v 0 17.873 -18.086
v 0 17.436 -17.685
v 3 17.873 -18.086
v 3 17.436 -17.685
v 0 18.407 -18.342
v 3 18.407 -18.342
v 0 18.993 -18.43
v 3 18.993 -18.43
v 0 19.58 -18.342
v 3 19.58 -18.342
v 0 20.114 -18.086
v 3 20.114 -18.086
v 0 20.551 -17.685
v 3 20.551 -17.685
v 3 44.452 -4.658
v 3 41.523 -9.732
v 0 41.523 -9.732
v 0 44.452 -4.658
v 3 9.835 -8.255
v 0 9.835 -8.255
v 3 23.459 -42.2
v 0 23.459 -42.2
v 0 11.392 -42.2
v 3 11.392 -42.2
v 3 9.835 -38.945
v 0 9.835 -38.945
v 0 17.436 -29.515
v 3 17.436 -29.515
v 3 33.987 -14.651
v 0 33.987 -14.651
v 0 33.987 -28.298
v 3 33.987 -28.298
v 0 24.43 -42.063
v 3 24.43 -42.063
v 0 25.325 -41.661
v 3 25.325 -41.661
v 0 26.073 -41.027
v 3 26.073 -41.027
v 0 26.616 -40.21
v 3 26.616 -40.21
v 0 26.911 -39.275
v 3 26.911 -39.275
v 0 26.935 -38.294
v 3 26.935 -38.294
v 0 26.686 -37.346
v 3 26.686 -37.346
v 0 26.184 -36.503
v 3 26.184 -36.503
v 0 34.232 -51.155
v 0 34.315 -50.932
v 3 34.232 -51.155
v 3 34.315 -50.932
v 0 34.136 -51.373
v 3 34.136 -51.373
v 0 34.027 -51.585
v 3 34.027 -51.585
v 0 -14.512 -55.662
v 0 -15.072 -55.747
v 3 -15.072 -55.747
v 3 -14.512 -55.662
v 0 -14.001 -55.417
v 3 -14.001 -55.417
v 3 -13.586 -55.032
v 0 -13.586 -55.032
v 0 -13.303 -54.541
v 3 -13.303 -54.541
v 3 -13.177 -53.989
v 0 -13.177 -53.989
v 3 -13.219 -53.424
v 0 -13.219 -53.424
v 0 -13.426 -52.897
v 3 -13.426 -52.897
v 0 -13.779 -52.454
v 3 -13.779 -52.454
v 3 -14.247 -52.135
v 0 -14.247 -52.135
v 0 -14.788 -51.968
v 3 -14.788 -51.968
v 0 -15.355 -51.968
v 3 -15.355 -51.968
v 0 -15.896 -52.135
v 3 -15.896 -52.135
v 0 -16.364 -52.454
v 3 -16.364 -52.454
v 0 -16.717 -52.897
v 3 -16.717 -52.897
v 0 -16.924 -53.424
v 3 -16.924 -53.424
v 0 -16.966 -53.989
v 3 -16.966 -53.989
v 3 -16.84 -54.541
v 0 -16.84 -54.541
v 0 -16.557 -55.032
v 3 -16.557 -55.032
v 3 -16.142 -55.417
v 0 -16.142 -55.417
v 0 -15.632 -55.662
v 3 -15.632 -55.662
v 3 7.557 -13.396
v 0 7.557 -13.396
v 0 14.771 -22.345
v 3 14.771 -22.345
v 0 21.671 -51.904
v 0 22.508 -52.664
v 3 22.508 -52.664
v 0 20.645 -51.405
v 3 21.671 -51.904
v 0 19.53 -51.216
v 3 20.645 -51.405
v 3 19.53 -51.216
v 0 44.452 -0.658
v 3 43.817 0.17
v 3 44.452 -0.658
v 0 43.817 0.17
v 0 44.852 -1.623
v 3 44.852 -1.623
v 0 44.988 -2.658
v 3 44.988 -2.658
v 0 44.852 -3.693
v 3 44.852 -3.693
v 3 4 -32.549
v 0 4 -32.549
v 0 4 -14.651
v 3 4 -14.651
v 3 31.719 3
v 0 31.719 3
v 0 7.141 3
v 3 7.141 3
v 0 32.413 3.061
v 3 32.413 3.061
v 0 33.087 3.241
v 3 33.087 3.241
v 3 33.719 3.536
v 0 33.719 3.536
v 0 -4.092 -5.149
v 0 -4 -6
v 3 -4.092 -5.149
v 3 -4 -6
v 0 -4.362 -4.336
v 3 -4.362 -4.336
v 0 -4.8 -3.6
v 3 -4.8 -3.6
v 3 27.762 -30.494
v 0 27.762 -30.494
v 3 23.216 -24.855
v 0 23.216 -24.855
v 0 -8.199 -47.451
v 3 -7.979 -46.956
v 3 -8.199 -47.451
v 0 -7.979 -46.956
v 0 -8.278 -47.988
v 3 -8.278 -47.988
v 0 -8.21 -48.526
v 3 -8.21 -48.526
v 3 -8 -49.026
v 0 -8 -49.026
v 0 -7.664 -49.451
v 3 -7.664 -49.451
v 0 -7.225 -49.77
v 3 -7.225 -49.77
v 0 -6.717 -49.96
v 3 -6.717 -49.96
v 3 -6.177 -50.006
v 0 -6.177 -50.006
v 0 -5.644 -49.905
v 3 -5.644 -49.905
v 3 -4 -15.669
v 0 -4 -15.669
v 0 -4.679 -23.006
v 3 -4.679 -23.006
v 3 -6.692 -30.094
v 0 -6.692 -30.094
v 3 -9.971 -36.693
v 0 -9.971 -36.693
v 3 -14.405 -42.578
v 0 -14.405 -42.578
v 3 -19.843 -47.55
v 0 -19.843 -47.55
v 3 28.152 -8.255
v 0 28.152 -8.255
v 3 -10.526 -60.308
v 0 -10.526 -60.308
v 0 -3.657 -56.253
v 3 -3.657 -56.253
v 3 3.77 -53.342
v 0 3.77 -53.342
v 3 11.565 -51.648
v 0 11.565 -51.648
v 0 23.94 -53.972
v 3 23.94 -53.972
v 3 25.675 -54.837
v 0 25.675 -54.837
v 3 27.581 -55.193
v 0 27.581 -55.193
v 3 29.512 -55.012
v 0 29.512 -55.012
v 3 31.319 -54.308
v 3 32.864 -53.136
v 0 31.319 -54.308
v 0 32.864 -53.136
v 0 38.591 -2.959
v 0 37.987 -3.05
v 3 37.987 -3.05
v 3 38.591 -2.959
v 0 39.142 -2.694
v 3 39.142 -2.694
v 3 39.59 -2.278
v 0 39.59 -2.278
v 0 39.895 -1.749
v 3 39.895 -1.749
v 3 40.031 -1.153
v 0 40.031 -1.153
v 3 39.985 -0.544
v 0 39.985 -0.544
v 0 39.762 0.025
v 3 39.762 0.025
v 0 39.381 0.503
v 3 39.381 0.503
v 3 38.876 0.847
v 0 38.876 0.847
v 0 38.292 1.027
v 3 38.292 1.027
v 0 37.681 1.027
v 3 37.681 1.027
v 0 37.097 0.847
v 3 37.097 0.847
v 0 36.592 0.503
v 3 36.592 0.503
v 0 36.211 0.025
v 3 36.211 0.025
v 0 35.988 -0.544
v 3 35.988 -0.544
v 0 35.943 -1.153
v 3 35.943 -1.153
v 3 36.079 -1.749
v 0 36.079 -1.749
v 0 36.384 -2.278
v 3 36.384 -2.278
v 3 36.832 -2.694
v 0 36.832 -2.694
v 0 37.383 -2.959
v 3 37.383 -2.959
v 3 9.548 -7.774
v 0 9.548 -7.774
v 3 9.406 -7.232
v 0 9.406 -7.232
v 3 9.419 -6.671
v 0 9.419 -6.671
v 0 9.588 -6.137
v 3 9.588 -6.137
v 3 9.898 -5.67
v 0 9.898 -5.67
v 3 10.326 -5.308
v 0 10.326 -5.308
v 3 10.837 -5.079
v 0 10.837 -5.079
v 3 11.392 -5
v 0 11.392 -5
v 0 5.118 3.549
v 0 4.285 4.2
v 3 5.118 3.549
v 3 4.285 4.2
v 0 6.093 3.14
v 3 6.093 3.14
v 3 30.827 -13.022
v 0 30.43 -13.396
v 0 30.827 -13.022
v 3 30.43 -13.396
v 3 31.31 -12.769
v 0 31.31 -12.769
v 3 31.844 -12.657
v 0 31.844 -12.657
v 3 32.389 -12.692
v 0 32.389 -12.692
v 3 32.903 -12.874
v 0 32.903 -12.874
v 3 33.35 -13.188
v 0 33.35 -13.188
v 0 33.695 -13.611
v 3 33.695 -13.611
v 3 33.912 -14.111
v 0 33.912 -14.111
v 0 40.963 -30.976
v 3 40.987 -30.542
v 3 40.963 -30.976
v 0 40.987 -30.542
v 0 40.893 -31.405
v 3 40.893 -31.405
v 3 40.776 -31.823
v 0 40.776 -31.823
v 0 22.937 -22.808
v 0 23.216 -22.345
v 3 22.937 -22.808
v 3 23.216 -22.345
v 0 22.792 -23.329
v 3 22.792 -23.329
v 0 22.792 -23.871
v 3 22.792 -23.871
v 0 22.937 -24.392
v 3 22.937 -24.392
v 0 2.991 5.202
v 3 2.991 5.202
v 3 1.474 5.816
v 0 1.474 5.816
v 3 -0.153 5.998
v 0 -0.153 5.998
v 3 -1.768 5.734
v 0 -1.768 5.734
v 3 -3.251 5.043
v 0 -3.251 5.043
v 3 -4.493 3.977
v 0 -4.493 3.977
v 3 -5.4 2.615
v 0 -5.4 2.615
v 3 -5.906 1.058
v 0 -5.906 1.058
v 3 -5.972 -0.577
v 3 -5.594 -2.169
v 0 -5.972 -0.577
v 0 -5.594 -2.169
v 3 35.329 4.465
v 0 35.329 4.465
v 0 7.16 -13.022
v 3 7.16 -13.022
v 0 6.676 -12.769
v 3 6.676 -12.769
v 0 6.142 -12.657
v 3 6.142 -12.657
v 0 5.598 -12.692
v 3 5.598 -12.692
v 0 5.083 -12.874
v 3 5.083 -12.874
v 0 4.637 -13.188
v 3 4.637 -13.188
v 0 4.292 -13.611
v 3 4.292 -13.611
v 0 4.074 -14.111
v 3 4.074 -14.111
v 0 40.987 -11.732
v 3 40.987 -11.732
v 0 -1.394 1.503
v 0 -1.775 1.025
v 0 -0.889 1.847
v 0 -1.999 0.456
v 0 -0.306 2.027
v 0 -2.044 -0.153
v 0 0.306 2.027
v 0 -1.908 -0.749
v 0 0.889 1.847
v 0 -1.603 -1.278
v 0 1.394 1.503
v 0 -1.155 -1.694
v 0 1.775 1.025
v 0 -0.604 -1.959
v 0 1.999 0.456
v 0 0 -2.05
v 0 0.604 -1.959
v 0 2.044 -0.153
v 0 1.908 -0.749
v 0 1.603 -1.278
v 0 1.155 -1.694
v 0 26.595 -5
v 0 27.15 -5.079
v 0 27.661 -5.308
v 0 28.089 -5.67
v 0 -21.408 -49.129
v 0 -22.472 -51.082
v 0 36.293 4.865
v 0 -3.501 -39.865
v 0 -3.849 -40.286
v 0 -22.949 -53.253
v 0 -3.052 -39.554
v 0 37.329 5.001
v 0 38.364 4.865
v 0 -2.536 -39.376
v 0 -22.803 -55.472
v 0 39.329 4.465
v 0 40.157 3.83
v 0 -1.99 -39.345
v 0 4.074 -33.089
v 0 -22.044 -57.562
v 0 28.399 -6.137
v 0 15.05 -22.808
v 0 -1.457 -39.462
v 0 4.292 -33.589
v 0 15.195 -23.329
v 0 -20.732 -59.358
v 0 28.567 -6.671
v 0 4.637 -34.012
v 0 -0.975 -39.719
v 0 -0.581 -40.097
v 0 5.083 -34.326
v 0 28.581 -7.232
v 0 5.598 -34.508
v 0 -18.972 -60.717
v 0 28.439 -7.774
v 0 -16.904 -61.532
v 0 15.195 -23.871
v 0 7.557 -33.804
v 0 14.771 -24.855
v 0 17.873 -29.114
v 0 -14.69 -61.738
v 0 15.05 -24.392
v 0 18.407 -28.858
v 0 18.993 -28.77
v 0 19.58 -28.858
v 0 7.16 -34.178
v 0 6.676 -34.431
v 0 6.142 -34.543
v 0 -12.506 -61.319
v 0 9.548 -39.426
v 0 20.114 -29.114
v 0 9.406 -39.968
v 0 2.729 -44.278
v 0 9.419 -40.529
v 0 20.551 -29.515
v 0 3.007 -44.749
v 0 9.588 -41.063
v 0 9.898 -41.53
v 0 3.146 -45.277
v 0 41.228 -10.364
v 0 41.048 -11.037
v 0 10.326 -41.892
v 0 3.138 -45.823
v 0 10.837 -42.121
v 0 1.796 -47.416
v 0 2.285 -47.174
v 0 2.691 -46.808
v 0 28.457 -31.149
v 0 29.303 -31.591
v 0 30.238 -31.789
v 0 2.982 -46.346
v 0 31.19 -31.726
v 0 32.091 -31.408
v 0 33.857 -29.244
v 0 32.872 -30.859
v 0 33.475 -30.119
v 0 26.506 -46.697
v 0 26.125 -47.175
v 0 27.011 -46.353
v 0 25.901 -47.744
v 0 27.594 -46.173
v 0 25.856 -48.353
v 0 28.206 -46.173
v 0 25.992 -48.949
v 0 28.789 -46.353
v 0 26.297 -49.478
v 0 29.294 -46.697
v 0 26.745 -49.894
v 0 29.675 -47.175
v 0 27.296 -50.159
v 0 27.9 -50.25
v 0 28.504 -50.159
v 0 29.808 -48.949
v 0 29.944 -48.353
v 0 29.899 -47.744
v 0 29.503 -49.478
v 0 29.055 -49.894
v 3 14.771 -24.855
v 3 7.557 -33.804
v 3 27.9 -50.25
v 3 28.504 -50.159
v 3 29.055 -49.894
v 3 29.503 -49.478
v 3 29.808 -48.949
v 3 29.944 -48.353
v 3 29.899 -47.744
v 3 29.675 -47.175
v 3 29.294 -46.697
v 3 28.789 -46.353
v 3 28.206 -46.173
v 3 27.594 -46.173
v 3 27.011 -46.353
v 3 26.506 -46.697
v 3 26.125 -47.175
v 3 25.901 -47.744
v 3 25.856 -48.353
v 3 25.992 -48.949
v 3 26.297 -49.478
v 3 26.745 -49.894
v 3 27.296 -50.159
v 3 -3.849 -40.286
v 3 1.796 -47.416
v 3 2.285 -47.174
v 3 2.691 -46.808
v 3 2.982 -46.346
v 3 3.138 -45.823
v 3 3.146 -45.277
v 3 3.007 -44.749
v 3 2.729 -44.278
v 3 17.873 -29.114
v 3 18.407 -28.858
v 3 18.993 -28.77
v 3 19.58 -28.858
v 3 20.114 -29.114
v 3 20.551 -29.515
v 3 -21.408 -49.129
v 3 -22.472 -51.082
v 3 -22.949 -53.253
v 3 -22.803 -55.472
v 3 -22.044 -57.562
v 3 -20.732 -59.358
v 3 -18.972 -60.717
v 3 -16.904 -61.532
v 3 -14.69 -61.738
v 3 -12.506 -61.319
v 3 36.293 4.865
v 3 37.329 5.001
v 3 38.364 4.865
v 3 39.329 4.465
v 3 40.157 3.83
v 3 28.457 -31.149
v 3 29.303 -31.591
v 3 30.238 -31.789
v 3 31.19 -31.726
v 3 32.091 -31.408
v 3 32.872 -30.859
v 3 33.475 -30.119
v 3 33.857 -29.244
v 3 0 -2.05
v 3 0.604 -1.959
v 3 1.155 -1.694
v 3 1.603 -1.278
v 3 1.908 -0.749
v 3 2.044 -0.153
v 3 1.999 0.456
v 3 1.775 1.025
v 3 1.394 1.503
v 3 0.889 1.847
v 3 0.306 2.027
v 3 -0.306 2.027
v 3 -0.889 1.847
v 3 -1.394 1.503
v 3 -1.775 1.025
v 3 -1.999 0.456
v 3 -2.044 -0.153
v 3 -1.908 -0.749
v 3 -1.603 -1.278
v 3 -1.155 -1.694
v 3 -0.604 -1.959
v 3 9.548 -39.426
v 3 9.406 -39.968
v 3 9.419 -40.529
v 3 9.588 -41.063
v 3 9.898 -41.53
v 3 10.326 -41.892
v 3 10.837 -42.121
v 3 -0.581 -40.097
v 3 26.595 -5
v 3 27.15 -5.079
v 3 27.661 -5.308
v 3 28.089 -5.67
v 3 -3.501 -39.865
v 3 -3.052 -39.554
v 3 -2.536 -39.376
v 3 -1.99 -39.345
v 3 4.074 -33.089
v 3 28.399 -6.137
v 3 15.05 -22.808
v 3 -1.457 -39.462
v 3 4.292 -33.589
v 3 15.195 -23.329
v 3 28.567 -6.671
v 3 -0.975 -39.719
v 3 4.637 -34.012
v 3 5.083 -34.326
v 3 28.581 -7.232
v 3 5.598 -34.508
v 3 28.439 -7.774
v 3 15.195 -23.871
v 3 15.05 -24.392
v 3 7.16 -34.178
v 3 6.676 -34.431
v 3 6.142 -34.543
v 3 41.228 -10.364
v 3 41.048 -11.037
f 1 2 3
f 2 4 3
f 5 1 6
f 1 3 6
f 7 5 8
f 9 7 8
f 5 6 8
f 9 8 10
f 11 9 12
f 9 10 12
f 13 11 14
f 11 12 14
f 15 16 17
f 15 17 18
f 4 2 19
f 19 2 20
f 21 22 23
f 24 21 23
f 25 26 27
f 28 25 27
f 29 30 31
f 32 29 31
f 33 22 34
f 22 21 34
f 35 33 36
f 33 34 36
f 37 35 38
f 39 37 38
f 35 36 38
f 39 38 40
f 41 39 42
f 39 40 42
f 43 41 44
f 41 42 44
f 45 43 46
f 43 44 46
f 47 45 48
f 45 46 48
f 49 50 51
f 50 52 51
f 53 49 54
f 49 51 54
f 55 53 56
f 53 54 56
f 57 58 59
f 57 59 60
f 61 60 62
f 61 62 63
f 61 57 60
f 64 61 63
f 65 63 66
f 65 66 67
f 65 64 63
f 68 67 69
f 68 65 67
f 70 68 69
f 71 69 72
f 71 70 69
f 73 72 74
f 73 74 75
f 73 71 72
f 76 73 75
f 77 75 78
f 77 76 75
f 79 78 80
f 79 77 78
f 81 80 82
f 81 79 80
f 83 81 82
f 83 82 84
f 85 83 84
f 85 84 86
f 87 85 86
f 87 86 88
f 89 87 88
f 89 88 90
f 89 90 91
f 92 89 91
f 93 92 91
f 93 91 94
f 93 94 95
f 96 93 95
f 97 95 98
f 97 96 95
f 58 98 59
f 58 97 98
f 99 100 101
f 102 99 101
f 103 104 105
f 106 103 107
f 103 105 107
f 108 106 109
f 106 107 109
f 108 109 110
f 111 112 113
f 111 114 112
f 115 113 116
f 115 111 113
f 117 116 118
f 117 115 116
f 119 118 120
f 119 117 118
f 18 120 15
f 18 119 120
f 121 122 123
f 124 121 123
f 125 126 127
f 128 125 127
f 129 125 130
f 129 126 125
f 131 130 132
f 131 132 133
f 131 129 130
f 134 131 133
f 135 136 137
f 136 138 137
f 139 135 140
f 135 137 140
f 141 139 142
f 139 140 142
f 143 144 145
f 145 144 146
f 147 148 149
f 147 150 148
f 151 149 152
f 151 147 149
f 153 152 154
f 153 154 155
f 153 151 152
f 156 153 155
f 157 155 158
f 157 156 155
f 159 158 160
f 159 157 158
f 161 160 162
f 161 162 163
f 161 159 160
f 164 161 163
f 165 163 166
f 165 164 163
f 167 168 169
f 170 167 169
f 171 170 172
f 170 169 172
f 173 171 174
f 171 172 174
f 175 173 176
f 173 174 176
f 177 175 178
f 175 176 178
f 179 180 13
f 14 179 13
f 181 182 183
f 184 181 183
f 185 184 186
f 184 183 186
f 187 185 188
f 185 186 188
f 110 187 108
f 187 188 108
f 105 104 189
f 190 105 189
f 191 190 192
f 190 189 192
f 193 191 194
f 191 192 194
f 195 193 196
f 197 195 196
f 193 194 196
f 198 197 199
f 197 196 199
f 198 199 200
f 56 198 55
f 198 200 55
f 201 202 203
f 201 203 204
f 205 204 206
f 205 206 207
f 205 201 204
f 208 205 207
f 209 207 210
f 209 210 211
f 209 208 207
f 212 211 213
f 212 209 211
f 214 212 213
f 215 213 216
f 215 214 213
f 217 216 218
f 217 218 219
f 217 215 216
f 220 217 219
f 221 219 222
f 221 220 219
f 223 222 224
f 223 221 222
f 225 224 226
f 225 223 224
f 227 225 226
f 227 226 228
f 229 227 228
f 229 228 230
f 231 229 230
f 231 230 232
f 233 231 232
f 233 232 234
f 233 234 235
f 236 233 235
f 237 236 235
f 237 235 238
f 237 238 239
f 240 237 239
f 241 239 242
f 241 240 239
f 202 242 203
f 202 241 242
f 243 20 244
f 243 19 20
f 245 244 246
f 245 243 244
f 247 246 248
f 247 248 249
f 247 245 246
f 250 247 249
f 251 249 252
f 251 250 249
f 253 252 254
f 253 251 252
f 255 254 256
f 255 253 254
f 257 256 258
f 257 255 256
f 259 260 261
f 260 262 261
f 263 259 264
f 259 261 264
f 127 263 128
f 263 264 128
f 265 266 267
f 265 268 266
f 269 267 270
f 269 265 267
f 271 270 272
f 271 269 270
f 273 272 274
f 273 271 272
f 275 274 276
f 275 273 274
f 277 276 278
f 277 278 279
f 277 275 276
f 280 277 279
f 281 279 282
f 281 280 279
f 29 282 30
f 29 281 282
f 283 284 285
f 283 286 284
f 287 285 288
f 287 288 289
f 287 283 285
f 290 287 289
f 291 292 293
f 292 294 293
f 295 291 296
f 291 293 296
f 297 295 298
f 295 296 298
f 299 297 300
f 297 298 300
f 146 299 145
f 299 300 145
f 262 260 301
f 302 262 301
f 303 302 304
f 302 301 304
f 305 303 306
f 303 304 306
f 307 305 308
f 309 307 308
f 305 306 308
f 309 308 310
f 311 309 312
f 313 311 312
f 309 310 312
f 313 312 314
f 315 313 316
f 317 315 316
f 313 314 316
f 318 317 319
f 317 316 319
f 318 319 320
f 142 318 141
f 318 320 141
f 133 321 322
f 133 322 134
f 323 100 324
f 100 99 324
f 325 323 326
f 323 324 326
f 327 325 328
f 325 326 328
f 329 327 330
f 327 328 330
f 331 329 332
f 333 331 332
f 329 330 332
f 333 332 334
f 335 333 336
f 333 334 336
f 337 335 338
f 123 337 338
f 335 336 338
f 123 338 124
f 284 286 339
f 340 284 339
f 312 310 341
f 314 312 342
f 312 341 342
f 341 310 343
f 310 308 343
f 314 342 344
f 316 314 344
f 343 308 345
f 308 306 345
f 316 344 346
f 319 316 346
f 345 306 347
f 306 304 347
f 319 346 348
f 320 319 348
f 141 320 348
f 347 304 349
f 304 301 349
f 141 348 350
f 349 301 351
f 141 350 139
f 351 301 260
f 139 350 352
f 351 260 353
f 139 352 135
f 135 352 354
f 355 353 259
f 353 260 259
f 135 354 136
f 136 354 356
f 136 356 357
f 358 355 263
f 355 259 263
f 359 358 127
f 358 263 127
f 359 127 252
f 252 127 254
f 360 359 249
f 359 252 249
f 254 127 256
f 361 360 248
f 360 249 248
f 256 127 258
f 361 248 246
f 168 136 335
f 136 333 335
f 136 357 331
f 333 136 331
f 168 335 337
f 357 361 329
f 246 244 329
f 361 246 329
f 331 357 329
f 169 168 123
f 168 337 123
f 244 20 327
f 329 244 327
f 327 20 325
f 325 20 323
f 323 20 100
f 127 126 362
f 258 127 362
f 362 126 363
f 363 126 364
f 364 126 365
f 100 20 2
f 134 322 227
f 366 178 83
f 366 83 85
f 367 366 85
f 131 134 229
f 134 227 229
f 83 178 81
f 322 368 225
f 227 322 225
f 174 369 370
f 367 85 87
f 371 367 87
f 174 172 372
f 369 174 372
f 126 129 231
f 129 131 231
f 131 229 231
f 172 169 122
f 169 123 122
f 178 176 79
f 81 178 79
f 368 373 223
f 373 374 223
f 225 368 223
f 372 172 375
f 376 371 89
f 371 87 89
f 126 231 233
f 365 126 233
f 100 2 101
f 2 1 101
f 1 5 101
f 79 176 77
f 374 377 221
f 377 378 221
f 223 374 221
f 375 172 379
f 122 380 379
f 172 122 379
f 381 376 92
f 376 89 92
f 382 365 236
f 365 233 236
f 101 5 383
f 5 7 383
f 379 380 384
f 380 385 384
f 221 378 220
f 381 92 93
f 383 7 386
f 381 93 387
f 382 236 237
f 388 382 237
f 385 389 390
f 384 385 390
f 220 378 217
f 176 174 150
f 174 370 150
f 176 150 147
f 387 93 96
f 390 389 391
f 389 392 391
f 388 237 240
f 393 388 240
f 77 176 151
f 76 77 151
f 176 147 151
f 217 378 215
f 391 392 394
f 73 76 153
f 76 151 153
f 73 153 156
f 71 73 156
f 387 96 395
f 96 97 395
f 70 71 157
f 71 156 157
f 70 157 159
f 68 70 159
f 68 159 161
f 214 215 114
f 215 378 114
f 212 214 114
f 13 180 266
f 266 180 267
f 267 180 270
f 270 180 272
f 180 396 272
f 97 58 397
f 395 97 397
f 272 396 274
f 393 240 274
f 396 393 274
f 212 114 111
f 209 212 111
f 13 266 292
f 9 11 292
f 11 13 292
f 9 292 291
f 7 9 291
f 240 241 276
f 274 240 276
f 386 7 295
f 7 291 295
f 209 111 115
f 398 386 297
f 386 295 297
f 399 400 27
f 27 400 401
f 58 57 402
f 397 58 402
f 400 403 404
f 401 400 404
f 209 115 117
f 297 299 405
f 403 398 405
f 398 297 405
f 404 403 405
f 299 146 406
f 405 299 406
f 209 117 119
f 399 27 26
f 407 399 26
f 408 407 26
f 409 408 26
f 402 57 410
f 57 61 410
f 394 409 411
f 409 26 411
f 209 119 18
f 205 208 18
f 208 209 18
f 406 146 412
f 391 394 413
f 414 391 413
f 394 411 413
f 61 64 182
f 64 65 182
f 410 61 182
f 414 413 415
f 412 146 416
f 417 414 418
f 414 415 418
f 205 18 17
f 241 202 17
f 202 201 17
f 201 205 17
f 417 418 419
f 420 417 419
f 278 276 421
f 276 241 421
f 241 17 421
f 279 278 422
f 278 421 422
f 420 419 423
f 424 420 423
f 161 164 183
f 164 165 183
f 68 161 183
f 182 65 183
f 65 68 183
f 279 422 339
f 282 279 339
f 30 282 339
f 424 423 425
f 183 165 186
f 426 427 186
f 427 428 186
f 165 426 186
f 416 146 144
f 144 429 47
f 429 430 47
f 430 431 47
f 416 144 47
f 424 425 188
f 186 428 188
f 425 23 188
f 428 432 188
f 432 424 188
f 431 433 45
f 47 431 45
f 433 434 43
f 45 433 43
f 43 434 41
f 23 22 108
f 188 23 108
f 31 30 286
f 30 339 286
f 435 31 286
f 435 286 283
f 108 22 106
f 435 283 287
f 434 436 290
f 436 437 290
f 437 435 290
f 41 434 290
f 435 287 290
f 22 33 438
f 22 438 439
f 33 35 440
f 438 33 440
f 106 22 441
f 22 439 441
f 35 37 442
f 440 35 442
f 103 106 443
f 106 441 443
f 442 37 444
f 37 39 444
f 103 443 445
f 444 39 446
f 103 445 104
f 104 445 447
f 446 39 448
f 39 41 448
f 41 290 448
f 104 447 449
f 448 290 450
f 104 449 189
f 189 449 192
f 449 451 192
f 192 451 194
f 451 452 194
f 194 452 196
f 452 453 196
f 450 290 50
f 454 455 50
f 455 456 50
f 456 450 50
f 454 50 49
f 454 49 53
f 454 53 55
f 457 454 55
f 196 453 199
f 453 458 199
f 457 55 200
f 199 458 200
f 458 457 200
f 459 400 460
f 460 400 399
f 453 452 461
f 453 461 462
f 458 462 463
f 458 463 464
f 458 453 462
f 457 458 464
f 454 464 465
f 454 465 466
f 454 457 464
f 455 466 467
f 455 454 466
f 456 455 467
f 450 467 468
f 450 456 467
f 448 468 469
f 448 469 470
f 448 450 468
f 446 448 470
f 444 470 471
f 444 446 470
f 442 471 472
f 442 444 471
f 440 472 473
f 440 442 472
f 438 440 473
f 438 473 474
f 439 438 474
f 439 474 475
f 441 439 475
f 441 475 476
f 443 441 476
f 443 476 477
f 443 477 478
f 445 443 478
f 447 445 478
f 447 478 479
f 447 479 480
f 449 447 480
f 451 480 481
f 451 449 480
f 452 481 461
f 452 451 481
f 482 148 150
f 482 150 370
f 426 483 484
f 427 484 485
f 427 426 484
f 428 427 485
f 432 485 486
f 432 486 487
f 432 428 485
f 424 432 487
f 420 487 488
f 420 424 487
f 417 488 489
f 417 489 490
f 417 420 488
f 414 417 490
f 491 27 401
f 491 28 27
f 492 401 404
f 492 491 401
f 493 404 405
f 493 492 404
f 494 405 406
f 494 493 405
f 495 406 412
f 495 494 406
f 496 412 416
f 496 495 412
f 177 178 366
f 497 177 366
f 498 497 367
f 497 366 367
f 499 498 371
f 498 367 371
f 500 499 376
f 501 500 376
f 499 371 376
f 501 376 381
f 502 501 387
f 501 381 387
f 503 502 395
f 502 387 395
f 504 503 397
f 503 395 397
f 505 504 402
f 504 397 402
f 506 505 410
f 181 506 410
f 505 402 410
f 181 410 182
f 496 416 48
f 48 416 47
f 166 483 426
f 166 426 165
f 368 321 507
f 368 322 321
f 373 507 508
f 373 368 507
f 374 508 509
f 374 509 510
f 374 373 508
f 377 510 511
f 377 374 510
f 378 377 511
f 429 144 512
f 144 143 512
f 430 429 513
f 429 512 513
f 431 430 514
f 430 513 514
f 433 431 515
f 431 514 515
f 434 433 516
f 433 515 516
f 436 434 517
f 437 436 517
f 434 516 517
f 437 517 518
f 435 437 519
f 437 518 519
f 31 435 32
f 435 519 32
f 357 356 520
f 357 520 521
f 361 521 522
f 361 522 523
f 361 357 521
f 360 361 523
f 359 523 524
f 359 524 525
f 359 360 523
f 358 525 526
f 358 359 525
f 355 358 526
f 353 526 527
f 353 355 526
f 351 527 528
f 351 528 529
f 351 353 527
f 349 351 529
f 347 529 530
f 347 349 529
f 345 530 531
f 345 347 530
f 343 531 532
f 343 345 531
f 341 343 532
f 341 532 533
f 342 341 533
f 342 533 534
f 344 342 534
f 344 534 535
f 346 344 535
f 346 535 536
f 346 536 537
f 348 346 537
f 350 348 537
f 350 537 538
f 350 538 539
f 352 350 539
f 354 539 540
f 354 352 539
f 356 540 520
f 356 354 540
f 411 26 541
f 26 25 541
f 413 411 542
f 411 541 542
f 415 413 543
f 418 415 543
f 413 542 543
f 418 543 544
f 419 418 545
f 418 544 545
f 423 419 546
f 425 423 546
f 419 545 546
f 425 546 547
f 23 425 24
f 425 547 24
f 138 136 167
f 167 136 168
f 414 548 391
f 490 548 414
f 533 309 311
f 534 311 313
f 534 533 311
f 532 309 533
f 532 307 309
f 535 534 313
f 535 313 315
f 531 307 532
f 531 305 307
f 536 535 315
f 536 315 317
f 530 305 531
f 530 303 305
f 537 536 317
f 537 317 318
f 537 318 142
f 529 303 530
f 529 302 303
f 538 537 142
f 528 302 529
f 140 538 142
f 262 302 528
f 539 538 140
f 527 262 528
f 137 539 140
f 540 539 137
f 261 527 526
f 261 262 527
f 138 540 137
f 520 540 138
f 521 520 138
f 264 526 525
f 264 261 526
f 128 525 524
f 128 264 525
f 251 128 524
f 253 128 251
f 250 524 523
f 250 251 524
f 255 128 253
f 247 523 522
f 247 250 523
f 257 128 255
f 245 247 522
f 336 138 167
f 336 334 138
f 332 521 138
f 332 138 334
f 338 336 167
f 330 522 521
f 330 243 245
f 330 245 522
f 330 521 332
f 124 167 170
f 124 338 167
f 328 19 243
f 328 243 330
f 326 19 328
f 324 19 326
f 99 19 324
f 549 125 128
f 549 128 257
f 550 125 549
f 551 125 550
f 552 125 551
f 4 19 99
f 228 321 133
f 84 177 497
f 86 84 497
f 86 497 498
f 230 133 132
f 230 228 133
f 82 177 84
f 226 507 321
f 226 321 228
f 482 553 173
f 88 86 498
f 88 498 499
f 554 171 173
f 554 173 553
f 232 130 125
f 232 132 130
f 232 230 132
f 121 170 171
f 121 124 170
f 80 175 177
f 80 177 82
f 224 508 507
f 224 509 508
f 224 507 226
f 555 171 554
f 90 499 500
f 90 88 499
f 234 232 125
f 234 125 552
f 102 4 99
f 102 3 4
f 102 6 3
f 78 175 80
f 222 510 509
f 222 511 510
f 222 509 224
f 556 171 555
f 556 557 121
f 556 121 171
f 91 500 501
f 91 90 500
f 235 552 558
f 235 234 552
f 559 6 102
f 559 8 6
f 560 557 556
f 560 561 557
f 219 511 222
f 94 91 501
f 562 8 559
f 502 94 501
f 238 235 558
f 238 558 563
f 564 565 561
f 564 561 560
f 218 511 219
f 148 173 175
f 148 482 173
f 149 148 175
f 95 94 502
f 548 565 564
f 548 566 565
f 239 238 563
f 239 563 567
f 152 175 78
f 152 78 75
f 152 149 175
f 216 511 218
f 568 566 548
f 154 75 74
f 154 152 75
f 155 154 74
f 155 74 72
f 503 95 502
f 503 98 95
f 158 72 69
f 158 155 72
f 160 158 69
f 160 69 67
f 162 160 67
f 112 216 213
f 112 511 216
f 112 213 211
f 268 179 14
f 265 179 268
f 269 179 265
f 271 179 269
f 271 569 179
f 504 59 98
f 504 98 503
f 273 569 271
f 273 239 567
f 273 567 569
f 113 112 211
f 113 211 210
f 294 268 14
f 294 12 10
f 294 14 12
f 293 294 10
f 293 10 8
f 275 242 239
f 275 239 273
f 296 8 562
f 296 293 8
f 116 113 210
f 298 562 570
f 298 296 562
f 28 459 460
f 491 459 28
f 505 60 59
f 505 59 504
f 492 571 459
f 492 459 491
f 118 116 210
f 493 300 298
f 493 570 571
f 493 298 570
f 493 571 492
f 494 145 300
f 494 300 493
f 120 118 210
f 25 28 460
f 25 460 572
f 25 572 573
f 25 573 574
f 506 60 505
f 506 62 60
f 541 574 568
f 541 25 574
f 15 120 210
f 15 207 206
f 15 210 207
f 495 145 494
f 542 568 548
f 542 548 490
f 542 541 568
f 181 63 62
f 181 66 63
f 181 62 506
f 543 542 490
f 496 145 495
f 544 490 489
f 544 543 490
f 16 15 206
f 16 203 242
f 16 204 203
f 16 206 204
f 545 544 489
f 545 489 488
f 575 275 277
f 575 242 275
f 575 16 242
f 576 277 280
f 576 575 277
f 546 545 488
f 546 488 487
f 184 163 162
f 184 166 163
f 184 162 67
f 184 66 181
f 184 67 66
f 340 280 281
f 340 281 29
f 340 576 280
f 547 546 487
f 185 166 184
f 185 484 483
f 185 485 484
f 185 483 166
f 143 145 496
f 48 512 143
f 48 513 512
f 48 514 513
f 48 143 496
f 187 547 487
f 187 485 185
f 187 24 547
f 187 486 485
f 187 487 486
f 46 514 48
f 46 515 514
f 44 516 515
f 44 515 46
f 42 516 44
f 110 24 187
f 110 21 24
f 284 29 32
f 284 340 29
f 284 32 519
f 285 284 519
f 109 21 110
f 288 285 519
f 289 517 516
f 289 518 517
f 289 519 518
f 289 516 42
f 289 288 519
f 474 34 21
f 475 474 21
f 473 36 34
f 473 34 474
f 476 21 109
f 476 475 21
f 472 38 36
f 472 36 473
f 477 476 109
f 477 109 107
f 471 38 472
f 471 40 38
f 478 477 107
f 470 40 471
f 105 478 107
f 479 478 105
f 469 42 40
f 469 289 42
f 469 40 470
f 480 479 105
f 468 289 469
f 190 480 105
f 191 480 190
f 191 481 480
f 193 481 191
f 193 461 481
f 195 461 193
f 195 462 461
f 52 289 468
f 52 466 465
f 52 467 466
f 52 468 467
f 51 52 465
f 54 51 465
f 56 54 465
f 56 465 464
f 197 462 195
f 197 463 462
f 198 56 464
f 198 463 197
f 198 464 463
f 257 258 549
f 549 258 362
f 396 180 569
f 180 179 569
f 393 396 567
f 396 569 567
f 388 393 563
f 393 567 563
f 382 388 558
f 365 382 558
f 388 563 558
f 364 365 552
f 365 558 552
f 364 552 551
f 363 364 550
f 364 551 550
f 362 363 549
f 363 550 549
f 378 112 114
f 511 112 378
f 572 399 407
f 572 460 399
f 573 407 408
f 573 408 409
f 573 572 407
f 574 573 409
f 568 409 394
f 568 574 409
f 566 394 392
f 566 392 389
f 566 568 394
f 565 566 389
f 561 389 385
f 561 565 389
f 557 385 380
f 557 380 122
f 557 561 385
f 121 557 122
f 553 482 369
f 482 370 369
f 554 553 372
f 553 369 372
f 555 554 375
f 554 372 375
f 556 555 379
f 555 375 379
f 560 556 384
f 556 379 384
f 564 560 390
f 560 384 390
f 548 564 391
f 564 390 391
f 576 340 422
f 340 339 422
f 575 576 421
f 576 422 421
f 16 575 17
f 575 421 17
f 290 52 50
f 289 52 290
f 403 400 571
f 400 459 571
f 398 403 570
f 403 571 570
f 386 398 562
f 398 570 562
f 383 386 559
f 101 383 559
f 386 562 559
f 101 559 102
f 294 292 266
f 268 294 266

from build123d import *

# Parameters (mm, degrees)
SKETCH_1_R          = 1.9
SKETCH_1_R_2        = 2.05
EXTRUDE_1_DEPTH     = 3
EXTRUDE_2_DEPTH     = 3
CUT_EXTRUDE_1_DEPTH = 10
FILLET_1_R          = 2
FILLET_2_R          = 4
FILLET_3_R          = 3.5
CUT_EXTRUDE_2_DEPTH = 10
FILLET_4_R          = 2


with BuildPart() as part:
    # 草图1 → 凸台-拉伸1 (new body)
    with BuildSketch(Plane(origin=(0, 0, 0), x_dir=(0, 0, -1), z_dir=(1, 0, 0))):
        with BuildLine():
            Line((-3, 40.986839826), (-3, 5.196152423))
            ThreePointArc((-3, 5.196152423), (-4.656619043, -3.783635697), (4.472135955, -4))
            Line((4.472135955, -4), (15.668888745, -4))
            ThreePointArc((15.668888745, -4), (33.469294357, -8.178978797), (47.550324088, -19.842721997))
            ThreePointArc((47.550324088, -19.842721997), (58.506158977, -21.45142262), (60.307864912, -10.525669029))
            ThreePointArc((60.307864912, -10.525669029), (53.0476279, 4.779832589), (51.314694229, 21.631134085))
            ThreePointArc((51.314694229, 21.631134085), (55.199709707, 27.963749659), (51.2, 34.22455532))
            Line((51.2, 34.22455532), (51.2, 40.986839826))
            Line((51.2, 40.986839826), (-3, 40.986839826))
        make_face()
        with Locations((53.846907568, -15.071659592)):
            Circle(SKETCH_1_R, mode=Mode.SUBTRACT)
        Circle(SKETCH_1_R_2, mode=Mode.SUBTRACT)
        Polygon((5, 7.211107417), (5, 30.775732409), (19.616479342, 18.993419913), align=None, mode=Mode.SUBTRACT)
        Polygon((38.216479342, 4), (8.983520658, 4), (23.6, 15.782312496), align=None, mode=Mode.SUBTRACT)
        with Locations((1, 37.986839826)):
            Circle(SKETCH_1_R_2, mode=Mode.SUBTRACT)
        Polygon((8.983520658, 33.986839826), (38.216479342, 33.986839826), (23.6, 22.204527331), align=None, mode=Mode.SUBTRACT)
        Polygon((27.583520658, 18.993419913), (42.2, 30.775732409), (42.2, 7.211107417), align=None, mode=Mode.SUBTRACT)
        with Locations((48.2, 27.9)):
            Circle(SKETCH_1_R_2, mode=Mode.SUBTRACT)
    extrude(amount=EXTRUDE_1_DEPTH)

    # 草图2 → 凸台-拉伸2 (add)
    with BuildSketch(Plane(origin=(3, 0, 0), x_dir=(0, 0, -1), z_dir=(1, 0, 0))):
        Polygon((10.660254038, 40.986839826), (2, 45.986839826), (-3, 40.986839826), align=None)
        Polygon((-3, 32.790687404), (-3, 40.986839826), (-6, 37.986839826), align=None)
    extrude(amount=-EXTRUDE_2_DEPTH)

    # 草图3 → 切除-拉伸1 (cut)
    with BuildSketch(Plane(origin=(3, 0, 0), x_dir=(0, 0, -1), z_dir=(1, 0, 0))):
        Polygon((51.2, 34.22455532), (31.2, 40.986839826), (51.2, 40.986839826), align=None)
    extrude(amount=-CUT_EXTRUDE_1_DEPTH, mode=Mode.SUBTRACT)

    # 圆角1
    fillet_1_edges = [part.edges().sort_by_distance(p)[0] for p in [
        (1.5, 22.204527331, -23.6),
        (1.5, 33.986839826, -8.983520658),
        (1.5, 30.775732409, -5),
        (1.5, 7.211107417, -5),
        (1.5, 18.993419913, -19.616479342),
        (1.5, 7.211107417, -42.2),
        (1.5, 18.993419913, -27.583520658),
        (1.5, 4, -8.983520658),
        (1.5, 4, -38.216479342),
        (1.5, 15.782312496, -23.6),
    ]]
    fillet(fillet_1_edges, radius=FILLET_1_R)

    # 圆角2
    fillet_2_edges = [part.edges().sort_by_distance(p)[0] for p in [
        (1.5, -4, -4.472135955),
        (1.5, 5.196152423, 3),
        (1.5, 34.22455532, -51.2),
        (1.5, 21.631134085, -51.314694229),
        (1.5, 45.986839826, -2),
        (1.5, 40.986839826, -10.660254038),
        (1.5, 37.986839826, 6),
        (1.5, 32.790687404, 3),
        (1.5, 40.986839826, -31.2),
    ]]
    fillet(fillet_2_edges, radius=FILLET_2_R)

    # 圆角3
    fillet_3_edges = [part.edges().sort_by_distance(p)[0] for p in [
        (1.5, 33.986839826, -38.216479342),
        (1.5, 30.775732409, -42.2),
    ]]
    fillet(fillet_3_edges, radius=FILLET_3_R)

    # 草图4 → 切除-拉伸2 (cut)
    with BuildSketch(Plane(origin=(3, 0, 0), x_dir=(0, 0, -1), z_dir=(1, 0, 0))):
        Polygon((37.863150267, -2.349540483), (46.512425203, 4.497802174), (51.661041238, -10.892084105), align=None)
    extrude(amount=-CUT_EXTRUDE_2_DEPTH, mode=Mode.SUBTRACT)

    # 圆角4
    fillet_4_edges = [part.edges().sort_by_distance(p)[0] for p in [
        (1.5, -10.892084105, -51.661041238),
        (1.5, -2.349540483, -37.863150267),
        (1.5, 4.497802174, -46.512425203),
    ]]
    fillet(fillet_4_edges, radius=FILLET_4_R)


solid = part.part
